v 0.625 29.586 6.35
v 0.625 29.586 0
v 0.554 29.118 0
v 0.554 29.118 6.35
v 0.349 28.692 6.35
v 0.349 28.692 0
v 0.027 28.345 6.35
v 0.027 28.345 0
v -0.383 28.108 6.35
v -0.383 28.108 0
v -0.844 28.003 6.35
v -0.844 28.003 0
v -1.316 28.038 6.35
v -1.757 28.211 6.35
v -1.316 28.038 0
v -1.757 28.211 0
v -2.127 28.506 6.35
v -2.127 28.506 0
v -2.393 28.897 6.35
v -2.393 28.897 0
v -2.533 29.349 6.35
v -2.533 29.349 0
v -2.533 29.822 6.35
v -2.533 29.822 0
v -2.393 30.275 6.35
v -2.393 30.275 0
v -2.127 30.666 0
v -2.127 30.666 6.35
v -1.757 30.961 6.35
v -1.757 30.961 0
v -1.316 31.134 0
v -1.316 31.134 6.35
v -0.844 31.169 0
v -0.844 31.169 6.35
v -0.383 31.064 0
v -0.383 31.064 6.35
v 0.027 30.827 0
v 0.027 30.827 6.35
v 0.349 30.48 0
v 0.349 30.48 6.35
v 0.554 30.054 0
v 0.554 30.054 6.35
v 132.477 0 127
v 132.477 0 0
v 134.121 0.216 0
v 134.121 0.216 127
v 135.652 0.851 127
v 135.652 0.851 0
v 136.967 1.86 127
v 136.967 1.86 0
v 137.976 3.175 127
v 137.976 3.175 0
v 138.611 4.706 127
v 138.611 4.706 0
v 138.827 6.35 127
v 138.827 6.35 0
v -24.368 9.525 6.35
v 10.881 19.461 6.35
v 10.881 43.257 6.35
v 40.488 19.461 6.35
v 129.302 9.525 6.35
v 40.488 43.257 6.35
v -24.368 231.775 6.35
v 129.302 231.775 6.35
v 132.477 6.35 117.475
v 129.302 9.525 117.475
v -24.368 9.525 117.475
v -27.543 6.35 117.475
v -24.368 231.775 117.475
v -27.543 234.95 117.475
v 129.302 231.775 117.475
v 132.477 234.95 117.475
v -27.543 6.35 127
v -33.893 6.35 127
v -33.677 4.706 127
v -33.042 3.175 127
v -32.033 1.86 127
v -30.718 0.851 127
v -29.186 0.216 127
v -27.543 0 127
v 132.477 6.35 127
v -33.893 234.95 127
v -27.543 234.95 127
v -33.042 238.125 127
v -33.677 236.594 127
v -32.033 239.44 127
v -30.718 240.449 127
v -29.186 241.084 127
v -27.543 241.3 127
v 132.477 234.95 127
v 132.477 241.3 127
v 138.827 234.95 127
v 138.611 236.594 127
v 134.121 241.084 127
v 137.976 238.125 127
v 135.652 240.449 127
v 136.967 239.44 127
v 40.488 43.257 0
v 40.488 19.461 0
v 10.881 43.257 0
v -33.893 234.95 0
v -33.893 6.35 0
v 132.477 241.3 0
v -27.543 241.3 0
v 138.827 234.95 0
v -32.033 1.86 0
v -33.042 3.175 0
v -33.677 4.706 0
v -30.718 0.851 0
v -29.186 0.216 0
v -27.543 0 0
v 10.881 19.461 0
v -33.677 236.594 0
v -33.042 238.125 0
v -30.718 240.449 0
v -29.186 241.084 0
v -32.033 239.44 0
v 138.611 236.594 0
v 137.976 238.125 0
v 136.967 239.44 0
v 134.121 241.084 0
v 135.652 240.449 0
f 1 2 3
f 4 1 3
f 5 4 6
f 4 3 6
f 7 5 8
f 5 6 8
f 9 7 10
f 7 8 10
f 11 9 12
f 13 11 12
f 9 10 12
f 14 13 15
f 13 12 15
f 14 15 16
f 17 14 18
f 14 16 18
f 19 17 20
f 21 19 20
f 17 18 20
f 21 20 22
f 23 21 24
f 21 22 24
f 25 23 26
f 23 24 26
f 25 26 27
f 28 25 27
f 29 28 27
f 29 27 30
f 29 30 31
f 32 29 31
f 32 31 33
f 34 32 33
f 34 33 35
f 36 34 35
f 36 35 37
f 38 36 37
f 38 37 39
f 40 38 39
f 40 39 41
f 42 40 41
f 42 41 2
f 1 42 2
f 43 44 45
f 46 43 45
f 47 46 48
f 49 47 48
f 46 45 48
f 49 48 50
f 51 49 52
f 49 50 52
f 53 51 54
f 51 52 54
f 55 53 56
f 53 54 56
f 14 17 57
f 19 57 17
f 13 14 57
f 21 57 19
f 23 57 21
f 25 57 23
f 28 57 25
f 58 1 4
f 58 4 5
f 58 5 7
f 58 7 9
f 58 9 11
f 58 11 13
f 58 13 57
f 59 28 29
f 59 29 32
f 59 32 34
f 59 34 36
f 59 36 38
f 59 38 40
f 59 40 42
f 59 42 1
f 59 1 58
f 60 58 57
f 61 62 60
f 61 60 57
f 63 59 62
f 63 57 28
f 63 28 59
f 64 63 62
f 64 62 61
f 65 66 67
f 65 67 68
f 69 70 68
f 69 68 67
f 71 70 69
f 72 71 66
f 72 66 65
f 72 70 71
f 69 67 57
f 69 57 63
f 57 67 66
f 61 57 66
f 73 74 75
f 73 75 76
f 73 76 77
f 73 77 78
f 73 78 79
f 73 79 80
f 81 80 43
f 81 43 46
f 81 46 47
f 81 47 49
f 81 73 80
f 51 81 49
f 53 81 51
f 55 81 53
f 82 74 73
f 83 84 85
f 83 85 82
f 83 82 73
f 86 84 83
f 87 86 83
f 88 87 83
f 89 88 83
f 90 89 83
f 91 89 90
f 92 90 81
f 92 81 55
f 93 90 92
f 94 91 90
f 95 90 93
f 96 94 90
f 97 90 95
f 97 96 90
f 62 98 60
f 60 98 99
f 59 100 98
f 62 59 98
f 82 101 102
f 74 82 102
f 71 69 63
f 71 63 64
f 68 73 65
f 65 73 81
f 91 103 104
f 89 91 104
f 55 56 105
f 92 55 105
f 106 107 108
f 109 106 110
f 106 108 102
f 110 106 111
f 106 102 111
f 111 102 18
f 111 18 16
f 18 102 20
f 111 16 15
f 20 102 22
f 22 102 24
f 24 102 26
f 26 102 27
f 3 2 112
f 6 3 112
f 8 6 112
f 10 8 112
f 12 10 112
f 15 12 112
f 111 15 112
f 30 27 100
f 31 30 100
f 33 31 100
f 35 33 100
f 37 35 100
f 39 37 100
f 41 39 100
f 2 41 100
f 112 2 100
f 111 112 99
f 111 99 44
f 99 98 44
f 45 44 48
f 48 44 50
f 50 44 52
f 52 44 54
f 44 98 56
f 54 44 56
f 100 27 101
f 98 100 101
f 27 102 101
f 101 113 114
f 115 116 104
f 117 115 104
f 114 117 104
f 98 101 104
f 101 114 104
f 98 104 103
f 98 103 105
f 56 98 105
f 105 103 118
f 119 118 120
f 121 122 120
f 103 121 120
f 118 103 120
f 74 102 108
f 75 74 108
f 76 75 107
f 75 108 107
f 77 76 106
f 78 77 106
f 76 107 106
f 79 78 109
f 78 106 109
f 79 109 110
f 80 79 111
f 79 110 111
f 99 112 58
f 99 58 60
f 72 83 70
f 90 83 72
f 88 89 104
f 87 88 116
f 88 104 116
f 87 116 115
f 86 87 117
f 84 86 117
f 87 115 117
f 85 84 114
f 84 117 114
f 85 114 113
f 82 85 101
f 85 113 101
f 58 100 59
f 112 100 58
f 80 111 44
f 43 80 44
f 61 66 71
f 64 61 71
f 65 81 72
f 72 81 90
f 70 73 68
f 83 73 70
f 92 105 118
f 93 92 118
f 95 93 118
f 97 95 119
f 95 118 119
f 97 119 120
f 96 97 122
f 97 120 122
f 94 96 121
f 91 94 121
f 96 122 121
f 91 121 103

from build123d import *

# Parameters (mm, degrees)
F1_DEPTH = 127
F2_T     = 6.35
F3_W     = 160.02
F3_H     = 228.6
F3_W_2   = 153.67
F3_H_2   = 222.25
F4_DEPTH = 127
F5_DEPTH = 9.525
F6_R     = 1.5875
F7_DEPTH = 25.4
F8_W     = 29.6064093709
F8_H     = 23.796312511
F9_DEPTH = 25.4


# Not quite as in the source:
# - a shell that OpenCascade refuses in one call is made with other operations: the cavity is built on its own and cut out


with BuildPart() as f1:
    # F0 (on Top) → F1 (new body)
    with BuildSketch(Plane.XY):
        with BuildLine():
            ThreePointArc((-33.8929891586, 6.35), (-32.0331172192, 1.8598719395), (-27.5429891586, 0))
            Line((-27.5429891586, 0), (132.4770108414, 0))
            ThreePointArc((132.4770108414, 0), (136.9671389019, 1.8598719395), (138.8270108414, 6.35))
            Line((138.8270108414, 6.35), (138.8270108414, 234.95))
            ThreePointArc((138.8270108414, 234.95), (136.9671389019, 239.4401280605), (132.4770108414, 241.3))
            Line((132.4770108414, 241.3), (-27.5429891586, 241.3))
            ThreePointArc((-27.5429891586, 241.3), (-32.0331172192, 239.4401280605), (-33.8929891586, 234.95))
            Line((-33.8929891586, 234.95), (-33.8929891586, 6.35))
        make_face()
    extrude(amount=F1_DEPTH)

    # F2: shell of thickness 6.35, made by hand


with BuildPart() as f2_core1:
    # F2_t2: copy of F1
    add(f1.part)

    # the walls: a layer under each face that stays
    f2_faces = [f2_core1.faces().sort_by_distance(p)[0] for p in [
        (52.4670108414, 0, 63.5),
        (138.8270108414, 120.65, 63.5),
        (52.4670108414, 241.3, 63.5),
        (-33.8929891586, 120.65, 63.5),
        (52.4670108414, 120.65, 0),
    ]]
    thicken(f2_faces, amount=-F2_T, mode=Mode.SUBTRACT)


with BuildPart() as f1_1:
    add(f1.part)

    # what is left inside the walls is the cavity
    f2_cavity = [f2_core1.part.solids().sort_by_distance(p)[0] for p in [
        (52.467011, 82.55, 6.4135),
    ]]
    add(f2_cavity, mode=Mode.SUBTRACT)

    # F3 (on face) → F4 (join)
    with BuildSketch(Plane.XY.offset(127)):
        with Locations((52.4670108414, 120.65)):
            Rectangle(F3_W, F3_H)
        with Locations((52.4670108414, 120.65)):
            Rectangle(F3_W_2, F3_H_2, mode=Mode.SUBTRACT)
    extrude(amount=-F4_DEPTH)

    # F3 (on face) → F5 (cut)
    with BuildSketch(Plane.XY.offset(127)):
        with Locations((52.4670108414, 120.65)):
            Rectangle(F3_W, F3_H)
        with Locations((52.4670108414, 120.65)):
            Rectangle(F3_W_2, F3_H_2, mode=Mode.SUBTRACT)
    extrude(amount=-F5_DEPTH, mode=Mode.SUBTRACT)

    # F6 (on face) → F7 (cut)
    with BuildSketch(Plane(origin=(0, 0, 0), x_dir=(1, 0, 0), z_dir=(0, 0, -1))):
        with Locations((-0.9629237612, -29.5858253049)):
            Circle(F6_R)
    extrude(amount=-F7_DEPTH, mode=Mode.SUBTRACT)

    # F8 (on face) → F9 (cut)
    with BuildSketch(Plane(origin=(0, 0, 0), x_dir=(1, 0, 0), z_dir=(0, 0, -1))):
        with Locations((25.6846360862, -31.3592217863)):
            Rectangle(F8_W, F8_H)
    extrude(amount=-F9_DEPTH, mode=Mode.SUBTRACT)


solid = f1_1.part
